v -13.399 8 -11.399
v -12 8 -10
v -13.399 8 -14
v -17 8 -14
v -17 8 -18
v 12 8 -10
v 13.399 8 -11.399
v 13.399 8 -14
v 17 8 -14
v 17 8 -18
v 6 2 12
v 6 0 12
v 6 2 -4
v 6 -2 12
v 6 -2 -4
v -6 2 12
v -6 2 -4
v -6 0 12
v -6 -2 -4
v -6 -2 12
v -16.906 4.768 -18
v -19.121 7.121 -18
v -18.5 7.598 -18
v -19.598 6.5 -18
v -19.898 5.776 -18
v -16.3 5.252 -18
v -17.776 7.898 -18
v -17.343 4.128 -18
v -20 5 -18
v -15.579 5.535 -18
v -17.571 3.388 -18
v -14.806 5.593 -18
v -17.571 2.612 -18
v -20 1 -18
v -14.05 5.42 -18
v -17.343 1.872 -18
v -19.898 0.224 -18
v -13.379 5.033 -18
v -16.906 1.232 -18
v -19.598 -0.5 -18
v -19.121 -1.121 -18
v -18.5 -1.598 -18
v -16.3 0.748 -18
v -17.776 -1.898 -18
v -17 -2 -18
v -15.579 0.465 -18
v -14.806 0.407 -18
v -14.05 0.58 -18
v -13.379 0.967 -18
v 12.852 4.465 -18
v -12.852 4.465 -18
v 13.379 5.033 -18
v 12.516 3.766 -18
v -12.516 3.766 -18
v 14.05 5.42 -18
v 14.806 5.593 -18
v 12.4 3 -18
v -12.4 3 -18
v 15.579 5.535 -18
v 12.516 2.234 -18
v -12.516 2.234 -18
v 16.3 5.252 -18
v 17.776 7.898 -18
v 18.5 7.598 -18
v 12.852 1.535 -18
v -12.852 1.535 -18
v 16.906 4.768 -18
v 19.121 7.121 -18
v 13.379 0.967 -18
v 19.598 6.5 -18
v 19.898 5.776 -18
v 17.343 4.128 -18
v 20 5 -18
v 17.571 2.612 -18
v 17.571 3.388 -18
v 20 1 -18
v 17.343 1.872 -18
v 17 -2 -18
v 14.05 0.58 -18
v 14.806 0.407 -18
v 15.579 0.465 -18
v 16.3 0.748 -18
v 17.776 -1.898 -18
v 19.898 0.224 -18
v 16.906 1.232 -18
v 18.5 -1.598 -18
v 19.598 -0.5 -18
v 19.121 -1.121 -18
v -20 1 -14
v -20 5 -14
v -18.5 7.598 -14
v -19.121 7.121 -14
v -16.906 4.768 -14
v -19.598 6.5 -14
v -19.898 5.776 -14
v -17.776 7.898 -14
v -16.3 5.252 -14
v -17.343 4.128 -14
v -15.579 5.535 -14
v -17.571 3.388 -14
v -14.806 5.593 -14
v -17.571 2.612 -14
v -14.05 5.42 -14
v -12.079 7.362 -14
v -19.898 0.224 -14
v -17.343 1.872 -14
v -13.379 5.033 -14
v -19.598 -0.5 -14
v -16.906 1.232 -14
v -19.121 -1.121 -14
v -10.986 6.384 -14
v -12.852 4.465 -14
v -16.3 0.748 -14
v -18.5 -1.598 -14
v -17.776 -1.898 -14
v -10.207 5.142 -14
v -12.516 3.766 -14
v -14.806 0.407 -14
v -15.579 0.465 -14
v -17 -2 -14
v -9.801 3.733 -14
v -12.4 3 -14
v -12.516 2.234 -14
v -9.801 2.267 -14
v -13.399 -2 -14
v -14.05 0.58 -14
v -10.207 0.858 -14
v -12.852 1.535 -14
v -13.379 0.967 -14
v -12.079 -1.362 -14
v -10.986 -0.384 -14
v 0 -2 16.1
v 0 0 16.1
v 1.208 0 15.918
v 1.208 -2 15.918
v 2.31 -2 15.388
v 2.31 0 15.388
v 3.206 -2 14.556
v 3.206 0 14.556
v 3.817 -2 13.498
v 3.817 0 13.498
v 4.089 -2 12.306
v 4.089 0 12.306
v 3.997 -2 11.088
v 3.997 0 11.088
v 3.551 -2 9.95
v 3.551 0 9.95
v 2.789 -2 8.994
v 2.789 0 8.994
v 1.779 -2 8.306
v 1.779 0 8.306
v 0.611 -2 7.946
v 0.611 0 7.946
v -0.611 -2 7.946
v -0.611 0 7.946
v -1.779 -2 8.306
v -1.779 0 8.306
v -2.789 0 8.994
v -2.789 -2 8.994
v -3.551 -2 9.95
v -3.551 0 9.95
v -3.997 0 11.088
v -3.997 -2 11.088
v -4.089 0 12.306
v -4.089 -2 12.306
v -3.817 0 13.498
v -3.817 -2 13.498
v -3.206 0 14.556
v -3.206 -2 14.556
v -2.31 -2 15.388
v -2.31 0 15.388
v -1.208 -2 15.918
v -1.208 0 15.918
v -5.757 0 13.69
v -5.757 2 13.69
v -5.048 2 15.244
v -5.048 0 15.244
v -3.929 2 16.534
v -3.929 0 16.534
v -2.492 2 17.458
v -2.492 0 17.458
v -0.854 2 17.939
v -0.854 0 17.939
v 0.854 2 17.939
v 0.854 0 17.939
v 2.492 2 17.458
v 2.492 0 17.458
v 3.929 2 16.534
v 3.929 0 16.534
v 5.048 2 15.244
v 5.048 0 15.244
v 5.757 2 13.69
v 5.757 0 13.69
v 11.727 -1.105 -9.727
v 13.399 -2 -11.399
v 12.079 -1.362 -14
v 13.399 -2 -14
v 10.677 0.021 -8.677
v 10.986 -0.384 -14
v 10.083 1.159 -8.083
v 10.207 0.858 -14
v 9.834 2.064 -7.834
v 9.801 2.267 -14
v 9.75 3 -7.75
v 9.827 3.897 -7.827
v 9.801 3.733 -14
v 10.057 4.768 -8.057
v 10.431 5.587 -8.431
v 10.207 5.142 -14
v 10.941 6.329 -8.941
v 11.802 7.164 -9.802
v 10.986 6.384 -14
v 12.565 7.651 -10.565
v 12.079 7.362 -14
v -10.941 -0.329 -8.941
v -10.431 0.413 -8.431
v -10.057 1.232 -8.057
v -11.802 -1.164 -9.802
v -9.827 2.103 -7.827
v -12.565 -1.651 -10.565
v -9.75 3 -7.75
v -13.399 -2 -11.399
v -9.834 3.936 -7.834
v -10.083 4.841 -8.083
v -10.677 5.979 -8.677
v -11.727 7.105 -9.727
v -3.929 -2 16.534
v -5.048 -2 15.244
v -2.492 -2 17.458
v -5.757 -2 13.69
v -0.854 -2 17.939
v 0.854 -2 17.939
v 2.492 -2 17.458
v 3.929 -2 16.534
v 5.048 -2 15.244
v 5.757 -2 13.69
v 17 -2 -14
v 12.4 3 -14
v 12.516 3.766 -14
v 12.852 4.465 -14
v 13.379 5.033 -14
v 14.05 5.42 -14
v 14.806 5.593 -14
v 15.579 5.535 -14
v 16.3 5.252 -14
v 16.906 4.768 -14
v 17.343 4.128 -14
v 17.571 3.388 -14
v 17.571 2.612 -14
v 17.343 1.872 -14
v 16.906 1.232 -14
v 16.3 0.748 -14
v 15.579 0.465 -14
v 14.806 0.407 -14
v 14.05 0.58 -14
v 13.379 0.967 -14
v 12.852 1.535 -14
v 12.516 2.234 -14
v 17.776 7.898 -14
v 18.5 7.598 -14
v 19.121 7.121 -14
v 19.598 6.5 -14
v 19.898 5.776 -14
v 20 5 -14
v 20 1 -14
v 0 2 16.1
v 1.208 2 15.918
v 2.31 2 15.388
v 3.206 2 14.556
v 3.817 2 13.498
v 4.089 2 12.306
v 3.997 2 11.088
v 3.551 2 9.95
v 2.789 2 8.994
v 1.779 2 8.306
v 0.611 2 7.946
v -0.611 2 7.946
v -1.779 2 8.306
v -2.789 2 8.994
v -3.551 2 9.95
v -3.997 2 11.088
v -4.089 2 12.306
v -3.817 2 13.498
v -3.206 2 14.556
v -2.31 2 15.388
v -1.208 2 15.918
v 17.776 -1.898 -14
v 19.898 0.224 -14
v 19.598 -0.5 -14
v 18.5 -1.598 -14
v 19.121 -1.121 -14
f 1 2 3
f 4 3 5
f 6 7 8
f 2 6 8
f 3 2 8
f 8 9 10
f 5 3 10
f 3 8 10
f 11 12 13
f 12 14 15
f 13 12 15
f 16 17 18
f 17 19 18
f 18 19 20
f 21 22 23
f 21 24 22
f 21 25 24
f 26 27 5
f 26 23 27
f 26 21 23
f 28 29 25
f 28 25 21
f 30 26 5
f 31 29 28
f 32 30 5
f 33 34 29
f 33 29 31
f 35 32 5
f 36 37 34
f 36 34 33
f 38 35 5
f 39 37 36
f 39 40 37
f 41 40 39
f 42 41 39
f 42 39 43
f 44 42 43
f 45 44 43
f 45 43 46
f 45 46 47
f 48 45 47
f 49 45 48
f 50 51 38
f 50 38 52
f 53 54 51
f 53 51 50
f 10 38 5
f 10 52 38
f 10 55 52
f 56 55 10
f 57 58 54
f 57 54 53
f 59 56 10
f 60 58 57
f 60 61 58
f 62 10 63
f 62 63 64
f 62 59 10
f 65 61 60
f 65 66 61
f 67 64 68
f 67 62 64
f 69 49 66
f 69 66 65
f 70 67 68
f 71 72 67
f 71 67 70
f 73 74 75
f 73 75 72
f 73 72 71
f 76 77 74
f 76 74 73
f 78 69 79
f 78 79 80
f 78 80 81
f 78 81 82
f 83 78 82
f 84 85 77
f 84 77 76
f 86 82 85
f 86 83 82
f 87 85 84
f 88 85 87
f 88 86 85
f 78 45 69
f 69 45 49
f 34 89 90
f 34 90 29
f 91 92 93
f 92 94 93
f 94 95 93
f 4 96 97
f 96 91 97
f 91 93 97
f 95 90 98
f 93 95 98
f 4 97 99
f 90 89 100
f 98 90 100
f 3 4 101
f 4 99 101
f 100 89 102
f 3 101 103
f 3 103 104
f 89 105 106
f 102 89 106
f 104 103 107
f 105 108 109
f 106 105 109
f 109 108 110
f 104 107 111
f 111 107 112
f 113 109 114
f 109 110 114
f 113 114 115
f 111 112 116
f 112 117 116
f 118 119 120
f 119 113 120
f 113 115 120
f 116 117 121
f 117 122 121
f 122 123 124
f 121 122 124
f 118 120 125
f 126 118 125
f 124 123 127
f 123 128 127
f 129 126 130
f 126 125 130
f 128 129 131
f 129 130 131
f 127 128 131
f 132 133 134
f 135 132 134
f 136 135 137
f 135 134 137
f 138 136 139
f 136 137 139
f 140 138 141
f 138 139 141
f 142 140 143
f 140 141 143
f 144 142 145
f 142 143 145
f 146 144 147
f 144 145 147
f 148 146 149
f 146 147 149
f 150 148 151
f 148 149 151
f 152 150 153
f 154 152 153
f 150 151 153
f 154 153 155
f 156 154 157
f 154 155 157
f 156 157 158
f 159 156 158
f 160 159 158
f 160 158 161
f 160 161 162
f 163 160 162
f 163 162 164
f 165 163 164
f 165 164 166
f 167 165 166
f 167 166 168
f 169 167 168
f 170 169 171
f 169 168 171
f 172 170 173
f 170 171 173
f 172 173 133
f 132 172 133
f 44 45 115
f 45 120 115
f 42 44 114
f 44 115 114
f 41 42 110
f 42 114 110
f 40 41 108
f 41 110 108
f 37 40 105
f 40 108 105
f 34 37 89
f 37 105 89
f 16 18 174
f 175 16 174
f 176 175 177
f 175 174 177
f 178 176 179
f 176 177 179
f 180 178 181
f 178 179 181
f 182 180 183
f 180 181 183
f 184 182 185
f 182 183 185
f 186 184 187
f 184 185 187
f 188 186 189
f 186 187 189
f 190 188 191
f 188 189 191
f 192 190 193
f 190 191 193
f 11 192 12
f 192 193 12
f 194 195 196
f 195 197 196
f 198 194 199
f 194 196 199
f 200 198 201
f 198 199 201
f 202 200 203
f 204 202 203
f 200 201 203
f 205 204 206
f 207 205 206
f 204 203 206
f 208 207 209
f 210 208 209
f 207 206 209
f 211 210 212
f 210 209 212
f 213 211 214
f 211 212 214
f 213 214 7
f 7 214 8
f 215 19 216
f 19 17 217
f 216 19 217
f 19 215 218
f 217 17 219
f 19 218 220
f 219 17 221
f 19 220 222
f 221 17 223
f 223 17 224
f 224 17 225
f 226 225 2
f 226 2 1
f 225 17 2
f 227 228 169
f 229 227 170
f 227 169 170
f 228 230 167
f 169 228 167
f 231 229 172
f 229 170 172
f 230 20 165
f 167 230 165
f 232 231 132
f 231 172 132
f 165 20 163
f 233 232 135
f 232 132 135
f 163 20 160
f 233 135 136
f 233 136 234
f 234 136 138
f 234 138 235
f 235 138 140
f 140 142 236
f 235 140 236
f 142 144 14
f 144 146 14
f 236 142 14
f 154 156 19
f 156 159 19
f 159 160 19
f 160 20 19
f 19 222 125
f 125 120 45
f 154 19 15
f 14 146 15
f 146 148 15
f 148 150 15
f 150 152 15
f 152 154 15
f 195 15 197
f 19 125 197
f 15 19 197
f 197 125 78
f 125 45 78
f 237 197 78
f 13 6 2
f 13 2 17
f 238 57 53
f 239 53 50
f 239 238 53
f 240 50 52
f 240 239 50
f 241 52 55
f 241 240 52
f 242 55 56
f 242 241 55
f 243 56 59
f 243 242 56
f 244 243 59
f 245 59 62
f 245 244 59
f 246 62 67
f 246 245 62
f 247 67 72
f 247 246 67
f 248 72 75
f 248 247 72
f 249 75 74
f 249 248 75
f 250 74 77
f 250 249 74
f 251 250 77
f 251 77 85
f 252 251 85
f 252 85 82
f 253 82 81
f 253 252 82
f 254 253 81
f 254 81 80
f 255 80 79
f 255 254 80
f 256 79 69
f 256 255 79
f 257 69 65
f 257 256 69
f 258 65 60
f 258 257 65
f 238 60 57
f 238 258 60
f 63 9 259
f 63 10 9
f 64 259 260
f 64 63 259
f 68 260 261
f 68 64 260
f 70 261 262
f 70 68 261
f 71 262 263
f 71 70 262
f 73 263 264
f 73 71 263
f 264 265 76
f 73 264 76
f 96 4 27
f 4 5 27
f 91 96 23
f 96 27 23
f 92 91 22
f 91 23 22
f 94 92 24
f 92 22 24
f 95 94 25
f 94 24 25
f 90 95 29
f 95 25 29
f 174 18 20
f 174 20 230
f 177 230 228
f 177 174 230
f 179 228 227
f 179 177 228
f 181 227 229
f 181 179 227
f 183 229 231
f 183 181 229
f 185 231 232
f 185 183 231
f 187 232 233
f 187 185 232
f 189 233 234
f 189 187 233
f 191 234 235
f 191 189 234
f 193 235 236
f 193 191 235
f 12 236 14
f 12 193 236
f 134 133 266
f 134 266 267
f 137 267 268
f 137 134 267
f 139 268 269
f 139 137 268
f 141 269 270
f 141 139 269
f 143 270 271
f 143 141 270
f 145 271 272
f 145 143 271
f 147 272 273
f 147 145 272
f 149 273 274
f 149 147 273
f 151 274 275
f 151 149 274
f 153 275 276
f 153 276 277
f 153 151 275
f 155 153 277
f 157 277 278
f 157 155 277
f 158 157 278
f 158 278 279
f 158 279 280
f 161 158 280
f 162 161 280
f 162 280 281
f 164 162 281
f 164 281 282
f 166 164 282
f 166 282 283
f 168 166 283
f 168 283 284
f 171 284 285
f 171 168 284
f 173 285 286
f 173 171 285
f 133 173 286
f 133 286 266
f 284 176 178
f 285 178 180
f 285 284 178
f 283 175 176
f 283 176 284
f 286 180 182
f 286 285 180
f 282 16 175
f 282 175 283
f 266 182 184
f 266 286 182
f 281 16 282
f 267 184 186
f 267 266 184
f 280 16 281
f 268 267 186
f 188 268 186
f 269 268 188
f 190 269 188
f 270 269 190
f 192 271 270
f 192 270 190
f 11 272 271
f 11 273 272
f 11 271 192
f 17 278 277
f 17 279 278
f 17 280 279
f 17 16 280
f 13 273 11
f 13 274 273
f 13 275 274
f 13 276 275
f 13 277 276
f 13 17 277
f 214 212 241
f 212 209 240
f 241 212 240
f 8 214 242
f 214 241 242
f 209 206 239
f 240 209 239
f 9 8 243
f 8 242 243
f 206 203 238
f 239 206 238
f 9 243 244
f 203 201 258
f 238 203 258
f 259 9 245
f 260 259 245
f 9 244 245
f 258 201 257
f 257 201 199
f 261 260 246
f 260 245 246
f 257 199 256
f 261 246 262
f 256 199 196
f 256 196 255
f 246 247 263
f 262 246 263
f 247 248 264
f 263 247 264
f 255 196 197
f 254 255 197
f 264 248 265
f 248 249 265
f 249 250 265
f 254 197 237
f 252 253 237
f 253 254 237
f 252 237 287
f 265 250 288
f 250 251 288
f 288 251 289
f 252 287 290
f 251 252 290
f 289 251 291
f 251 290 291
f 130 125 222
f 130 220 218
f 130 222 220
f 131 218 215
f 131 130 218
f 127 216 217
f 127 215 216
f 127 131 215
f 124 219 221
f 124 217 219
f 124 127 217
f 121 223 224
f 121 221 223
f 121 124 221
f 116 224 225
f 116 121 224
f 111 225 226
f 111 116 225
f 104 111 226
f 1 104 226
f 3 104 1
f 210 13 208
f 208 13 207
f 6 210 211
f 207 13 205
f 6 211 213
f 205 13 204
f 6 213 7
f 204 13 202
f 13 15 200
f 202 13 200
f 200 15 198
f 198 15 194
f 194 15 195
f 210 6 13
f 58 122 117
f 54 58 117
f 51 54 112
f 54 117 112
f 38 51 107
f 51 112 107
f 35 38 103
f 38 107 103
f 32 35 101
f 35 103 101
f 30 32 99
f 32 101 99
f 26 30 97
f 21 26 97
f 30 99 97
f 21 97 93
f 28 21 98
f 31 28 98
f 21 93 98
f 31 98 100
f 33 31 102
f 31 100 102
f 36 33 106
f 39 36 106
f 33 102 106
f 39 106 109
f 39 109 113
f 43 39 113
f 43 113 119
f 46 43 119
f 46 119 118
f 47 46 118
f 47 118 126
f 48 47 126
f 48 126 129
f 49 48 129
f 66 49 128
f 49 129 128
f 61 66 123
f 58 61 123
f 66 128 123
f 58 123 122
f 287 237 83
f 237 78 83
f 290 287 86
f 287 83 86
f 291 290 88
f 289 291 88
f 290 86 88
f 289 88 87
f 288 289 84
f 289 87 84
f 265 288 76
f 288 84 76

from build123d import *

# Parameters (mm, degrees)
ESBO_O1_R                = 6
ESBO_O1_R_2              = 4.1
RESSALTO_EXTRUS_O1_DEPTH = 2
ESBO_O2_W                = 40
ESBO_O2_H                = 4
RESSALTO_EXTRUS_O2_DEPTH = 6
CHANFRO3_SIZE            = 10
CHANFRO4_SIZE            = 10
CHANFRO5_SIZE            = 10
ESBO_O6_R                = 2.6
CORTE_EXTRUS_O2_DEPTH    = 39.574603044
ESBO_O7_R                = 5.25
CORTE_EXTRUS_O6_DEPTH    = 39.574603044
FILETE1_R                = 3


with BuildPart() as part:
    # Esboço1 → Ressalto-extrusão1 (new, symmetric)
    # profile 1 of 3: a face of its own
    with BuildSketch(Plane(origin=(0, 0, 0), x_dir=(1, 0, 0), z_dir=(0, 1, 0))):
        Polygon((20, 18), (-20, 18), (-20, 14), (-6, 14), (6, 14), (20, 14), align=None)
    # profile 2 of 3: a face of its own
    with BuildSketch(Plane(origin=(0, 0, 0), x_dir=(1, 0, 0), z_dir=(0, 1, 0))):
        with BuildLine():
            Line((6, 14), (-6, 14))
            Line((-6, 14), (-6, -12))
            ThreePointArc((-6, -12), (0, -6), (6, -12))
            Line((6, -12), (6, 14))
        make_face()
    # profile 3 of 3: a face of its own
    with BuildSketch(Plane(origin=(0, 0, 0), x_dir=(1, 0, 0), z_dir=(0, 1, 0))):
        with Locations((0, -12)):
            Circle(ESBO_O1_R)
        with Locations(Location((0, -12, 0), (0, 0, 270))):
            Circle(ESBO_O1_R_2, mode=Mode.SUBTRACT)
    extrude(amount=RESSALTO_EXTRUS_O1_DEPTH, both=True)

    # Esboço2 → Ressalto-extrusão2 (add)
    with BuildSketch(Plane(origin=(0, 2, 0), x_dir=(1, 0, 0), z_dir=(0, 1, 0))):
        with Locations((0, 16)):
            Rectangle(ESBO_O2_W, ESBO_O2_H)
    extrude(amount=RESSALTO_EXTRUS_O2_DEPTH)

    # Chanfro3
    chanfro3_edges = [part.edges().sort_by_distance(p)[0] for p in [
        (6, 0, -14),
    ]]
    chamfer(chanfro3_edges, length=CHANFRO3_SIZE)

    # Chanfro4
    chanfro4_edges = [part.edges().sort_by_distance(p)[0] for p in [
        (-6, 0, -14),
    ]]
    chamfer(chanfro4_edges, length=CHANFRO4_SIZE)

    # Chanfro5
    # the kernel refuses this chamfer: 10 mm, written as the material it adds along each edge
    with BuildSketch(Plane(origin=(-41.71682988, 2, -14), x_dir=(0, 0.9996219169112968, -0.027495876610586317), z_dir=(1, 0, 0))) as chanfro5_piece_1_section:
        Polygon((CHANFRO5_SIZE * 0.999621916911, CHANFRO5_SIZE * 0.0274958766106), (-CHANFRO5_SIZE * 0.0274958766106, CHANFRO5_SIZE * 0.999621916911), (0, 0), align=None)
    chanfro5_piece_1 = extrude(amount=83.433659759, mode=Mode.PRIVATE)
    chanfro5_piece_1 = split(chanfro5_piece_1, bisect_by=Plane(origin=(-11.43705518, 4.703831668, -9.43705518), z_dir=(0.7071067811865475, 0, -0.7071067811865476)), keep=Keep.TOP, mode=Mode.PRIVATE)
    chanfro5_piece_1 = split(chanfro5_piece_1, bisect_by=Plane(origin=(-9.624703453, 8, -11.249406907), z_dir=(0, -1, 0)), keep=Keep.TOP, mode=Mode.PRIVATE)
    chanfro5_piece_1 = split(chanfro5_piece_1, bisect_by=Plane(origin=(-6, 4.703831668, -11.249406907), z_dir=(-1, 0, 0)), keep=Keep.TOP, mode=Mode.PRIVATE)
    add(chanfro5_piece_1)
    with BuildSketch(Plane(origin=(-41.71682988, 2, -14), x_dir=(0, 0.9996219169112968, -0.027495876610586317), z_dir=(1, 0, 0))) as chanfro5_piece_2_section:
        Polygon((CHANFRO5_SIZE * 0.999621916911, CHANFRO5_SIZE * 0.0274958766106), (-CHANFRO5_SIZE * 0.0274958766106, CHANFRO5_SIZE * 0.999621916911), (0, 0), align=None)
    chanfro5_piece_2 = extrude(amount=83.433659759, mode=Mode.PRIVATE)
    chanfro5_piece_2 = split(chanfro5_piece_2, bisect_by=Plane(origin=(-6.125087245, 4.433681659, -4.125087245), z_dir=(0.7071067811865475, 0, -0.7071067811865476)), keep=Keep.TOP, mode=Mode.PRIVATE)
    chanfro5_piece_2 = split(chanfro5_piece_2, bisect_by=Plane(origin=(6.125087245, 4.433681659, -4.125087245), z_dir=(-0.7071067811865477, 0, -0.7071067811865474)), keep=Keep.TOP, mode=Mode.PRIVATE)
    chanfro5_piece_2 = split(chanfro5_piece_2, bisect_by=Plane(origin=(0, 8, -10.250174491), z_dir=(0, -1, 0)), keep=Keep.TOP, mode=Mode.PRIVATE)
    chanfro5_piece_2 = split(chanfro5_piece_2, bisect_by=Plane(origin=(6, 4.433681659, -10.250174491), z_dir=(-1, 0, 0)), keep=Keep.TOP, mode=Mode.PRIVATE)
    chanfro5_piece_2 = split(chanfro5_piece_2, bisect_by=Plane(origin=(-6, 4.433681659, -10.250174491), z_dir=(1, 0, 0)), keep=Keep.TOP, mode=Mode.PRIVATE)
    add(chanfro5_piece_2)
    with BuildSketch(Plane(origin=(-41.71682988, 2, -14), x_dir=(0, 0.9996219169112968, -0.027495876610586317), z_dir=(1, 0, 0))) as chanfro5_piece_3_section:
        Polygon((CHANFRO5_SIZE * 0.999621916911, CHANFRO5_SIZE * 0.0274958766106), (-CHANFRO5_SIZE * 0.0274958766106, CHANFRO5_SIZE * 0.999621916911), (0, 0), align=None)
    chanfro5_piece_3 = extrude(amount=83.433659759, mode=Mode.PRIVATE)
    chanfro5_piece_3 = split(chanfro5_piece_3, bisect_by=Plane(origin=(11.43705518, 4.703831668, -9.43705518), z_dir=(-0.7071067811865477, 0, -0.7071067811865474)), keep=Keep.TOP, mode=Mode.PRIVATE)
    chanfro5_piece_3 = split(chanfro5_piece_3, bisect_by=Plane(origin=(9.624703453, 8, -11.249406907), z_dir=(0, -1, 0)), keep=Keep.TOP, mode=Mode.PRIVATE)
    chanfro5_piece_3 = split(chanfro5_piece_3, bisect_by=Plane(origin=(6, 4.703831668, -11.249406907), z_dir=(1, 0, 0)), keep=Keep.TOP, mode=Mode.PRIVATE)
    add(chanfro5_piece_3)

    # Esboço6 → Corte-extrusão2 (cut, symmetric)
    with BuildSketch(Plane.XY.offset(-14)):
        with Locations((-15, 3)):
            Circle(ESBO_O6_R)
    corte_extrus_o2 = extrude(amount=CORTE_EXTRUS_O2_DEPTH, both=True, mode=Mode.SUBTRACT)

    # Esboço7 → Corte-extrusão6 (cut, through all)
    with BuildSketch(Plane.XY.offset(-14)):
        with Locations((-15, 3)):
            Circle(ESBO_O7_R)
    corte_extrus_o6 = extrude(amount=CORTE_EXTRUS_O6_DEPTH, mode=Mode.SUBTRACT)

    # Espelhar2: Corte-extrusão2, Corte-extrusão6 across plane
    add(corte_extrus_o2.mirror(Plane(origin=(0, 0, 0), x_dir=(0, 0, 1), z_dir=(1, 0, 0))), mode=Mode.SUBTRACT)
    add(corte_extrus_o6.mirror(Plane(origin=(0, 0, 0), x_dir=(0, 0, 1), z_dir=(1, 0, 0))), mode=Mode.SUBTRACT)

    # Filete1
    filete1_edges = [part.edges().sort_by_distance(p)[0] for p in [
        (20, -2, -16),
        (-20, -2, -16),
        (-20, 8, -16),
        (20, 8, -16),
    ]]
    fillet(filete1_edges, radius=FILETE1_R)


solid = part.part
